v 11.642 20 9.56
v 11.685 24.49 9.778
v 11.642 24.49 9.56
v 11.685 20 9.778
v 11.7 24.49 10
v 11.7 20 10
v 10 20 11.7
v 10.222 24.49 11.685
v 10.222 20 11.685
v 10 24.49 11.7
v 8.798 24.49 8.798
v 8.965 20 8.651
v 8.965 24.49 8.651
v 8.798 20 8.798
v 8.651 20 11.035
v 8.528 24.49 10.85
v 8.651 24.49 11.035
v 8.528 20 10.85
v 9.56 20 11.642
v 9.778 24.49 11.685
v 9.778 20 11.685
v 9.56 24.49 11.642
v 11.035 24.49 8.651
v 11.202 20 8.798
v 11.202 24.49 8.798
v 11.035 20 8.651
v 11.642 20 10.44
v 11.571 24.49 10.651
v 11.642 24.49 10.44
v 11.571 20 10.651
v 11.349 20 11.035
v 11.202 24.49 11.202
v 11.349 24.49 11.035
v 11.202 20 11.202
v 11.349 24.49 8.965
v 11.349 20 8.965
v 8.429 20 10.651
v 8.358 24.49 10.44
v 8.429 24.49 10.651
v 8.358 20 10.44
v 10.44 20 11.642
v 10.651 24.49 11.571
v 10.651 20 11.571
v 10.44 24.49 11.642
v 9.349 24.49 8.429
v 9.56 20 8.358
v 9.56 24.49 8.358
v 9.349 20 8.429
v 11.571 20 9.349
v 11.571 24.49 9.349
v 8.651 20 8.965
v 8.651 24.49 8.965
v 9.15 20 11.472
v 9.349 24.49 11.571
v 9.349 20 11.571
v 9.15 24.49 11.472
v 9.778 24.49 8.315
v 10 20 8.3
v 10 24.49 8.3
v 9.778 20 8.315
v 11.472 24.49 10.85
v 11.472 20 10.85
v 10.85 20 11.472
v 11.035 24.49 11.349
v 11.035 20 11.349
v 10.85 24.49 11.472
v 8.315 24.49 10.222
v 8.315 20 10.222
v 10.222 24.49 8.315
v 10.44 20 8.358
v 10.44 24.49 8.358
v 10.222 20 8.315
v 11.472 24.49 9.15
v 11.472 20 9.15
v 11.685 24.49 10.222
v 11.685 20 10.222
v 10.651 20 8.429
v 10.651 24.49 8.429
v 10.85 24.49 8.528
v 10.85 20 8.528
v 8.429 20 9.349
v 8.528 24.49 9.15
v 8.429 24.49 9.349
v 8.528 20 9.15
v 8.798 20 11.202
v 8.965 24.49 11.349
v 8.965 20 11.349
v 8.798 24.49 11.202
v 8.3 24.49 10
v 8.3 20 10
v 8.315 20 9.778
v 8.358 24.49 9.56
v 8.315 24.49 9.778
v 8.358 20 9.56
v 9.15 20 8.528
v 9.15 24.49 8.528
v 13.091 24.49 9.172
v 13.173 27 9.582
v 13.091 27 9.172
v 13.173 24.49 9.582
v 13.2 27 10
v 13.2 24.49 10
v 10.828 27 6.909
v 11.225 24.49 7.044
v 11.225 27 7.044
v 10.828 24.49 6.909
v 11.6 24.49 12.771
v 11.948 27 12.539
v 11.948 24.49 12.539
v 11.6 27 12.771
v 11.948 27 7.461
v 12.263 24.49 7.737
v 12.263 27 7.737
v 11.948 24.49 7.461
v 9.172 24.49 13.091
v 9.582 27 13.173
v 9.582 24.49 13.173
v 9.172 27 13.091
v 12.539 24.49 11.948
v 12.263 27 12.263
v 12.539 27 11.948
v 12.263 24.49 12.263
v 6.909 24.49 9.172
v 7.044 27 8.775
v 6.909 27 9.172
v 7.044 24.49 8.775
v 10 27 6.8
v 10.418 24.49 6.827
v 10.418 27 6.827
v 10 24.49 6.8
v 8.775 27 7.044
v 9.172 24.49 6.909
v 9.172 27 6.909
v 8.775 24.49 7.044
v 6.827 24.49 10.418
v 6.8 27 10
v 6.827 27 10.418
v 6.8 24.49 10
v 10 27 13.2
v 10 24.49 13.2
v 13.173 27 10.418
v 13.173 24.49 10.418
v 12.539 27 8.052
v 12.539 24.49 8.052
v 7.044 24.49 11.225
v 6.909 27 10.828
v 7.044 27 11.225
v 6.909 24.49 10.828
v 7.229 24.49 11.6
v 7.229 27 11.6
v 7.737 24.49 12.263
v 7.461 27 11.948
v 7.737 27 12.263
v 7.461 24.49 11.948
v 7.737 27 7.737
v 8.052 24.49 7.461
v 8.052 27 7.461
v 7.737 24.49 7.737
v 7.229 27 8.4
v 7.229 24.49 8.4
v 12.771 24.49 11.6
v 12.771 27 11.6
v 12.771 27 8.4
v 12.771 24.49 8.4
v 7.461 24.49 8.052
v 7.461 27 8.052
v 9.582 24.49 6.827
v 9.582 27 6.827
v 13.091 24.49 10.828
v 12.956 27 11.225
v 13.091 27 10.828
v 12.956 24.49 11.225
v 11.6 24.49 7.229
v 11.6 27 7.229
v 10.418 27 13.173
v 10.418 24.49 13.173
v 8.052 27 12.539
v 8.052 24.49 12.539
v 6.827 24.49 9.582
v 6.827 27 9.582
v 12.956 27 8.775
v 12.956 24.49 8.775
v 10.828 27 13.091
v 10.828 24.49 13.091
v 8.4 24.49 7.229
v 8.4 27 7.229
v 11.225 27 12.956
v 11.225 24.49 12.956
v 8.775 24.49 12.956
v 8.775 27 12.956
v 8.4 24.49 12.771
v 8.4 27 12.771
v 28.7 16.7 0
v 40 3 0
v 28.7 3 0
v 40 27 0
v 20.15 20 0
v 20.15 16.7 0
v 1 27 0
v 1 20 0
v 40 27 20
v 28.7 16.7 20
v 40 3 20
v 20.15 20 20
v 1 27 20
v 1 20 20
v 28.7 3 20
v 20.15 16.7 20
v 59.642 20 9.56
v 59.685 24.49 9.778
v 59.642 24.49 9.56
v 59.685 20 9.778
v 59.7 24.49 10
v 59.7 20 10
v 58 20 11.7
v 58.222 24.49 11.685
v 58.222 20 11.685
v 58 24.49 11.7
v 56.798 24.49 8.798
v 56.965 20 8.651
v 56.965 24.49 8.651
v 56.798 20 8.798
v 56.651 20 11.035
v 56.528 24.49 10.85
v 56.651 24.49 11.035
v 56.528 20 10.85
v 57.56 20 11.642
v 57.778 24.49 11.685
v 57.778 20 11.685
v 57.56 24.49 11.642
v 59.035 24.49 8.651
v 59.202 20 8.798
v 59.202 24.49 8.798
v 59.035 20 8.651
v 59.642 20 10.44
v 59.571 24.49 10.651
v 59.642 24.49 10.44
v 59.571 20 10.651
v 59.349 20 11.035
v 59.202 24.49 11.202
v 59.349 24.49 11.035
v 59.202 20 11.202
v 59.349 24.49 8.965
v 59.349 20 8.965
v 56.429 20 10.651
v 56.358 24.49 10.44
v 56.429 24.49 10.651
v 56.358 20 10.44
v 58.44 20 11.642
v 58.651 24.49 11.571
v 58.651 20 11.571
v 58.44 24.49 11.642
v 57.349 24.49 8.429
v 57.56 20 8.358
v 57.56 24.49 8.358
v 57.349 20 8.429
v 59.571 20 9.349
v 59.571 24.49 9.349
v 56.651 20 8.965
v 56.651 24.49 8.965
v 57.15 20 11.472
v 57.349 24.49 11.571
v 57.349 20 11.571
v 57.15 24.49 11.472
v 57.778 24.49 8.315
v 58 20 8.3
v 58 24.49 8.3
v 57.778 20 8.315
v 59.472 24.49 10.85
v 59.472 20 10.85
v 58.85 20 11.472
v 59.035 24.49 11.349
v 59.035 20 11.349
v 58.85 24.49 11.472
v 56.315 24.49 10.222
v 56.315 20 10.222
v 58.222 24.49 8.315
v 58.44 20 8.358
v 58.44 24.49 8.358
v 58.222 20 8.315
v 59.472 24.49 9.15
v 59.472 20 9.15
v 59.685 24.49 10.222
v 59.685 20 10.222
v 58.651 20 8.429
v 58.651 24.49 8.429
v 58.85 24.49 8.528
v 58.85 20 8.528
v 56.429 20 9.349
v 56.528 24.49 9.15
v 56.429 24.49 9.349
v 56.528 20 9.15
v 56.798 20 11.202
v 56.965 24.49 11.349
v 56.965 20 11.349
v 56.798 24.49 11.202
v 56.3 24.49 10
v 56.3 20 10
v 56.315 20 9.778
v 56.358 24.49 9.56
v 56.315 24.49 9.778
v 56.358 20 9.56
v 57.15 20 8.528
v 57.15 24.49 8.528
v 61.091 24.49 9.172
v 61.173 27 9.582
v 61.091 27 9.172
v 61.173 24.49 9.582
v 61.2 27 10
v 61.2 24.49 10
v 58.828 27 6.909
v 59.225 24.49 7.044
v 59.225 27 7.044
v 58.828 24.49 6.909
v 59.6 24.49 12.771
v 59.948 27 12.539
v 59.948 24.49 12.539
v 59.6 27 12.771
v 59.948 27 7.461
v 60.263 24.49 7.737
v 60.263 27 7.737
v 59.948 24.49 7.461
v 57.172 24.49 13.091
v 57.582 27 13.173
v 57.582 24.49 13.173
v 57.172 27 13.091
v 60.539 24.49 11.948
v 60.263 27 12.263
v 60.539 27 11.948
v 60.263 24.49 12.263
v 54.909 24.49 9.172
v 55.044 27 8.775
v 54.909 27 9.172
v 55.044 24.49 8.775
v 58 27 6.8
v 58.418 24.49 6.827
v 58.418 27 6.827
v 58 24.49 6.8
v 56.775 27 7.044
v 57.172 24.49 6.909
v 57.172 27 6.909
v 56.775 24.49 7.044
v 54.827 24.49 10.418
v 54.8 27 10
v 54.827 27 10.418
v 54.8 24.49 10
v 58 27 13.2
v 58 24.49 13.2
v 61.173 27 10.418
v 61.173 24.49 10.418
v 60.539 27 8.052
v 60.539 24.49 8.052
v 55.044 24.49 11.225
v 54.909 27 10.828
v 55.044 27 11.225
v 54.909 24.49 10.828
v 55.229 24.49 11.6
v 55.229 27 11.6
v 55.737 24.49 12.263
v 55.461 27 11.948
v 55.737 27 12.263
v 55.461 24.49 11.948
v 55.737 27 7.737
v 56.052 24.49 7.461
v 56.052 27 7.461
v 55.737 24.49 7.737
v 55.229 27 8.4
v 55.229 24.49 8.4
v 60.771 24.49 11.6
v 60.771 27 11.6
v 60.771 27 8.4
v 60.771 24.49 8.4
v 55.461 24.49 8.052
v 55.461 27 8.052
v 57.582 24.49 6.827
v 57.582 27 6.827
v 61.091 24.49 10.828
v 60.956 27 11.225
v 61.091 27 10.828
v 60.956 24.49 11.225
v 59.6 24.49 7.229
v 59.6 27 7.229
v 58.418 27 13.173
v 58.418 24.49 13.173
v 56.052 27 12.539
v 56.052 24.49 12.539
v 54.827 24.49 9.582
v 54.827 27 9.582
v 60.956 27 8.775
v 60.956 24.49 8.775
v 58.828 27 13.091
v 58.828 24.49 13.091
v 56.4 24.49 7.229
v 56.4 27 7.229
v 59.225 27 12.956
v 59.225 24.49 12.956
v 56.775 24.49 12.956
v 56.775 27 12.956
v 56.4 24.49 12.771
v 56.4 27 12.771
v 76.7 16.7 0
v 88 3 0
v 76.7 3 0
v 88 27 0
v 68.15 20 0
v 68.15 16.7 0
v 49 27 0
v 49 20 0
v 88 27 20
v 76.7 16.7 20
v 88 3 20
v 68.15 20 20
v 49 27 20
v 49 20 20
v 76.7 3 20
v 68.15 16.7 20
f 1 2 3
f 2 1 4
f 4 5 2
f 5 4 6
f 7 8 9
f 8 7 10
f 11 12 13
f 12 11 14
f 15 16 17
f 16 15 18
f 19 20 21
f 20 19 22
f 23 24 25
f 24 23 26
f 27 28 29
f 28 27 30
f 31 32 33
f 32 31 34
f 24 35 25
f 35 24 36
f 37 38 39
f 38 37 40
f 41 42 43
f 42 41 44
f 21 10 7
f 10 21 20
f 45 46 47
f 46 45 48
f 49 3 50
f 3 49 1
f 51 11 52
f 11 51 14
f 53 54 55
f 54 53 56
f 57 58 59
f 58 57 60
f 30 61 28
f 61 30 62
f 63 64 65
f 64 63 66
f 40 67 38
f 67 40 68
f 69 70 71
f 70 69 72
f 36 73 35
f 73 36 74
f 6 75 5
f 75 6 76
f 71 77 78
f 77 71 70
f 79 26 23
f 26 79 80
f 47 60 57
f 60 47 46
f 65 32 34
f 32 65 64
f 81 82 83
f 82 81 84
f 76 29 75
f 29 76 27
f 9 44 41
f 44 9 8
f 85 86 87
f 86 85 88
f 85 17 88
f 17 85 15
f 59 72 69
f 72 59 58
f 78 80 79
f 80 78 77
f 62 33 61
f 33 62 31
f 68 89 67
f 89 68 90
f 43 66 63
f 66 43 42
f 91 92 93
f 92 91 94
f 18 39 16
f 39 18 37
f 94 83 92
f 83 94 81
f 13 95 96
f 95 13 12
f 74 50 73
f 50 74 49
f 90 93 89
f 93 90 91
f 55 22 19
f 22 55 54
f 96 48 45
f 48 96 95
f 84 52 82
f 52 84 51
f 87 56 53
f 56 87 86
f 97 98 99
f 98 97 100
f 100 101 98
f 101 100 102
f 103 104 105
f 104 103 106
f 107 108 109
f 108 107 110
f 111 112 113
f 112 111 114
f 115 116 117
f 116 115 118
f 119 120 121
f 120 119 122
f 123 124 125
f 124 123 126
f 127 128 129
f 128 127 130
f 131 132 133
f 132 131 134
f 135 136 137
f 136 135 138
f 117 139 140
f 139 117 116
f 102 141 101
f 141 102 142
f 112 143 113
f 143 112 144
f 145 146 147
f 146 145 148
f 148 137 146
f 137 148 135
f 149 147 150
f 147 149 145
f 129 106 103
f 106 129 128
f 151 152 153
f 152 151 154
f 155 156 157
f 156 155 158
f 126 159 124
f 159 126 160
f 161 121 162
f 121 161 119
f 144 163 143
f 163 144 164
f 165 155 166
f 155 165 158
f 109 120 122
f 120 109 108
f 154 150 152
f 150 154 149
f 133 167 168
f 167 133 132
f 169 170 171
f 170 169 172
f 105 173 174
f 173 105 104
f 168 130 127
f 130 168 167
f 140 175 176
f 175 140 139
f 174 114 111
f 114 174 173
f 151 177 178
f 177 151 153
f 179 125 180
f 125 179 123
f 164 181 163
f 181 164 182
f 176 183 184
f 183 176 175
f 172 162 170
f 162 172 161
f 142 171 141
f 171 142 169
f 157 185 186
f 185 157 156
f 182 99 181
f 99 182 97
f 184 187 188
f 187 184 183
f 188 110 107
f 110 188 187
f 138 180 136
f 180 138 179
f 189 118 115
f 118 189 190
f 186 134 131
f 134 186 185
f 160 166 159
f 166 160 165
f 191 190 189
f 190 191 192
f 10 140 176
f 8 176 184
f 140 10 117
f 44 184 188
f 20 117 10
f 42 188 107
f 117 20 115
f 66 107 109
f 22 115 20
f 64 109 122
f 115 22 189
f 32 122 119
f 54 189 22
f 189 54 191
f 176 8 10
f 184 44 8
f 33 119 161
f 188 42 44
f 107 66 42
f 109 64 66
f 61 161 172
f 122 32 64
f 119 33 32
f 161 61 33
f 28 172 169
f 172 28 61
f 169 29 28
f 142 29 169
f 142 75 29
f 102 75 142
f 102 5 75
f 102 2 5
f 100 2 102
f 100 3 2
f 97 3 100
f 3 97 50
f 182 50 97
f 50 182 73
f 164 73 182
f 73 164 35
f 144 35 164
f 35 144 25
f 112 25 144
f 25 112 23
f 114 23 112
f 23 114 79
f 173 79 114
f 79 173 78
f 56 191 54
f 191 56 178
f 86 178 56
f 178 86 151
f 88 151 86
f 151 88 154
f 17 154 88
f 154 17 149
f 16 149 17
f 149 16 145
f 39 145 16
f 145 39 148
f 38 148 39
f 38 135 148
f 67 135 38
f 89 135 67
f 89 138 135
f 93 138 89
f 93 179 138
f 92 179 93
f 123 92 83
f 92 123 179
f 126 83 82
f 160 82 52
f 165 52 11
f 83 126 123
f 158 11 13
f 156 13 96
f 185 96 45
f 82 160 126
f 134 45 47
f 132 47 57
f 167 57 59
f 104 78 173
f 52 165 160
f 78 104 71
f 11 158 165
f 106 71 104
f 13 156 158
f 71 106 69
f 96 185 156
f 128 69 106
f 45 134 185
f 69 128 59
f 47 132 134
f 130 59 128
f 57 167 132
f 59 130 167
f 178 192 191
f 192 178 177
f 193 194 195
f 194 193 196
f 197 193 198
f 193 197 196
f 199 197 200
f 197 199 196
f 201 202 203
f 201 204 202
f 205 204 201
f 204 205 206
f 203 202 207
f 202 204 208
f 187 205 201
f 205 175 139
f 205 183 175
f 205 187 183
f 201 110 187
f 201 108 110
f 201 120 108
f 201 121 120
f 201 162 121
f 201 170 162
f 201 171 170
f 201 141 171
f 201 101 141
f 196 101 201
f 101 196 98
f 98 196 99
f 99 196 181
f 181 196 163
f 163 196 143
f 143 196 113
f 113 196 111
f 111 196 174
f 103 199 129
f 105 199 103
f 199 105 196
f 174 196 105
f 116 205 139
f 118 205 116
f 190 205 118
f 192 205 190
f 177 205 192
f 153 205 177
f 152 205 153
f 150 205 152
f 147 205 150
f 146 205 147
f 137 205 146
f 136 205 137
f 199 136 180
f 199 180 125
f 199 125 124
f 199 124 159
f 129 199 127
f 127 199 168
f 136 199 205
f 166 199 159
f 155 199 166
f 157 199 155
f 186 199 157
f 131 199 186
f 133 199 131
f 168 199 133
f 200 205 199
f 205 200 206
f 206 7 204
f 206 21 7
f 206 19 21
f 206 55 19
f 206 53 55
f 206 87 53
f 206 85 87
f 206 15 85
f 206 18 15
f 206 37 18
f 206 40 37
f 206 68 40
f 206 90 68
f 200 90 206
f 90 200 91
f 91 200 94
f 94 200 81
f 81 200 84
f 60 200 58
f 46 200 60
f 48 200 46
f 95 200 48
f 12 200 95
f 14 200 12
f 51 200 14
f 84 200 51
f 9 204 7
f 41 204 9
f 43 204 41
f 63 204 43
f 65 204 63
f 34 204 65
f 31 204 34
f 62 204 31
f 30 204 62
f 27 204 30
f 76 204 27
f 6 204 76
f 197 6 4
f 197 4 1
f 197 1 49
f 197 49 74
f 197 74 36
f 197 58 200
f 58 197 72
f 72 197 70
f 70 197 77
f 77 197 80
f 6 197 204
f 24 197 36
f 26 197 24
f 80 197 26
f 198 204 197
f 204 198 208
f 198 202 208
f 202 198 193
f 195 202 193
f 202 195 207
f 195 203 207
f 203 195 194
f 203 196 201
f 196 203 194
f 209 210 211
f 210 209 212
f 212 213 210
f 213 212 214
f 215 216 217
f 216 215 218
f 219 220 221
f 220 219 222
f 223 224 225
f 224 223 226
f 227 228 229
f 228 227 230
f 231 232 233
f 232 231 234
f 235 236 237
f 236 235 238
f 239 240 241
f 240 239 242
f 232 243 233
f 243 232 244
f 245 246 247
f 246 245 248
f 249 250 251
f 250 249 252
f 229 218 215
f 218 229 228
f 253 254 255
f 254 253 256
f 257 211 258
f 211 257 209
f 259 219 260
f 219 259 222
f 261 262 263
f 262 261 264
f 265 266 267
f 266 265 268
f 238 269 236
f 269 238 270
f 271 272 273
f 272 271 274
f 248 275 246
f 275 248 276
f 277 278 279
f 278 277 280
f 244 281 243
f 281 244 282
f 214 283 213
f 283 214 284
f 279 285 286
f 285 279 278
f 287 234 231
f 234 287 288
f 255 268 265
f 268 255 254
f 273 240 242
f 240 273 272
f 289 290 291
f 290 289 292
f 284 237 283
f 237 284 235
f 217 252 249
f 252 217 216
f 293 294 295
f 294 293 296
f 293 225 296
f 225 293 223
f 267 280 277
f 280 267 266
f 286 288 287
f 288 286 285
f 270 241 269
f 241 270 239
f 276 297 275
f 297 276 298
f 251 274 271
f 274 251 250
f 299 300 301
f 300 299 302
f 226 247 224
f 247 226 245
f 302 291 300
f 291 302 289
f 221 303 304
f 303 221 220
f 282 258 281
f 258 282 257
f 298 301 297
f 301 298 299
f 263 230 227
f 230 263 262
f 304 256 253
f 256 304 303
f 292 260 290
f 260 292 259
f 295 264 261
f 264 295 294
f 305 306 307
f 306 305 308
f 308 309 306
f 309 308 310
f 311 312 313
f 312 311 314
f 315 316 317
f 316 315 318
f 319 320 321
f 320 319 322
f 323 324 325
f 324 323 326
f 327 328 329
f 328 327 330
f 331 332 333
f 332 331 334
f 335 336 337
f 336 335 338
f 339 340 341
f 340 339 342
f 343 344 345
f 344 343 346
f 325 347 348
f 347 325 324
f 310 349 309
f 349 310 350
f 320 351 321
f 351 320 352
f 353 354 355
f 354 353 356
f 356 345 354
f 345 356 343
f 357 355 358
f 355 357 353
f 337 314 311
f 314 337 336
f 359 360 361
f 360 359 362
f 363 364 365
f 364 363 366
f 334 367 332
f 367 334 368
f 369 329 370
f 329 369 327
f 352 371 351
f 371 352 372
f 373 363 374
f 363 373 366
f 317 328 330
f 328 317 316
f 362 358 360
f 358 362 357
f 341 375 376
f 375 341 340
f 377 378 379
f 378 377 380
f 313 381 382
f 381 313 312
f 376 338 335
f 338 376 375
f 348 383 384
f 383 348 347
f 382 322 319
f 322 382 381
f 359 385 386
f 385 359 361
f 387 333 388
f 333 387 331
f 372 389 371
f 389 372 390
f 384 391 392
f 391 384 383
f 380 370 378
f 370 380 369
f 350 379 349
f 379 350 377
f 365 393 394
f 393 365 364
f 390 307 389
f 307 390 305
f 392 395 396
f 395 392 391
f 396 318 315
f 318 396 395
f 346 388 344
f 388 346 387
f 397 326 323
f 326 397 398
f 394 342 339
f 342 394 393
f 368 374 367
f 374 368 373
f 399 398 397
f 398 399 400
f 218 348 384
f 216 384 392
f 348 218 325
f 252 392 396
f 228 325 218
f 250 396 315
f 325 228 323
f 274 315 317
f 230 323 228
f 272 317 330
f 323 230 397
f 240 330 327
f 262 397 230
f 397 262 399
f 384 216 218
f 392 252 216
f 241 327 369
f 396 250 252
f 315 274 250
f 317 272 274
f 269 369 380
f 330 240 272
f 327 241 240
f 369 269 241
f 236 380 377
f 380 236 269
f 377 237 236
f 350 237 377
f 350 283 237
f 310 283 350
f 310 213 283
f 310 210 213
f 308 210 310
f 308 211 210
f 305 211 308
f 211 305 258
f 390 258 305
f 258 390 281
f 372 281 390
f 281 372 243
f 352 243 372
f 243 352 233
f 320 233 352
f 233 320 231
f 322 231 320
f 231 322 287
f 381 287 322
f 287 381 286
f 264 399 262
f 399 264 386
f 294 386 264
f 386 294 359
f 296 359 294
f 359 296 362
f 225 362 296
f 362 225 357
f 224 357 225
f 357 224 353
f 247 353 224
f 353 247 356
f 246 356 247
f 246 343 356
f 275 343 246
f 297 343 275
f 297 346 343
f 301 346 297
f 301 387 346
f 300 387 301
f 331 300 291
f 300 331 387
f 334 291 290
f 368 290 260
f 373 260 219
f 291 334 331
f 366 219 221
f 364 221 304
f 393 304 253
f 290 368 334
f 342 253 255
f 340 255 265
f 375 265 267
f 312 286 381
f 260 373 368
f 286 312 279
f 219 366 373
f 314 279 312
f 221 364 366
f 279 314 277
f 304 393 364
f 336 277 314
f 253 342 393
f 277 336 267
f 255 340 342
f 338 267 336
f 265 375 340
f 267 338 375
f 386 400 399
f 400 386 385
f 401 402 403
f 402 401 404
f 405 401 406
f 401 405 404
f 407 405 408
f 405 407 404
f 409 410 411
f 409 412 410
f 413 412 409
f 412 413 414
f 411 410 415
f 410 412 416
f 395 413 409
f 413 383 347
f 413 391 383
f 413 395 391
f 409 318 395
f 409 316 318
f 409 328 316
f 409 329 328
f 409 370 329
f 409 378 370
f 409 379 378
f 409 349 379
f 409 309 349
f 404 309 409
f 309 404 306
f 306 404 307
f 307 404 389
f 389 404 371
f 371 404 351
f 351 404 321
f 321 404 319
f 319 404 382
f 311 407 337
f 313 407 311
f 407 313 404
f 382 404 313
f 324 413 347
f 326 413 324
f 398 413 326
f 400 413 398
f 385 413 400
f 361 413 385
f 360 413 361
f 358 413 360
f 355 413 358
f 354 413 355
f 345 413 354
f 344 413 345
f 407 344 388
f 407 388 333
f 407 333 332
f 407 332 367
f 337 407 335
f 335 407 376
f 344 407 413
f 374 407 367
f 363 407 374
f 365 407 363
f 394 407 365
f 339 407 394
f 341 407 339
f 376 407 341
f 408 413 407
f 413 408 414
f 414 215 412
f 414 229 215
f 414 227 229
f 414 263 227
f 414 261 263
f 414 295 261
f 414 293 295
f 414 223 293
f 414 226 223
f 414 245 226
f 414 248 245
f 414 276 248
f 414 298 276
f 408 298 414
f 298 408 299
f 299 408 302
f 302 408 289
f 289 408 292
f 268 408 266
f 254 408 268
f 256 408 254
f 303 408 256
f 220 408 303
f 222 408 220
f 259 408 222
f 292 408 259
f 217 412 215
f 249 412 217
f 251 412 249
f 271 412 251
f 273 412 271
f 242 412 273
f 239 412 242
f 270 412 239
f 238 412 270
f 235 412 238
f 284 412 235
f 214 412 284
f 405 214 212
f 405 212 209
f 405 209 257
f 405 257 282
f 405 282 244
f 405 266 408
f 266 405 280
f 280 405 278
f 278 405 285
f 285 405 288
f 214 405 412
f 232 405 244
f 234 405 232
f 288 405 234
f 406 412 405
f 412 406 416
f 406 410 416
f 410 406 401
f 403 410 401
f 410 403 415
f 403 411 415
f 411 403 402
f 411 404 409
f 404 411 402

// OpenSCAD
// X rail end stop, v2: clamps anywhere along the backer extrusion's TOP slot with one M3x10 + T-nut.
// No tapped end hole, no bumper screw. A leg hangs down in front of the rail and the edge of the
// carriage bracket's front plate runs into it, about 5 mm before the carriage itself would.
// One part serves both ends. Prints on its side (as loaded), no supports.
//
// Profile frame: U toward you (U=0 extrusion back face), V up (V=0 extrusion bottom). Extruded along the rail.

ext = 20; rail_h = 8; rail_w = 12; stack = 13; plate_t = 7;
len = 20;          // along the rail
top_t = 7;         // block on top of the extrusion
u0 = 1;            // clear of the lip / spacers behind
rail_gap = 0.7;    // around the rail
leg_bot = 3;       // leg reaches this far down (V)
screw_u = ext/2; m3_clear = 3.4; head_d = 6.4; head_cb = 2.5;
key_w = 5.8; key_h = 0;   // no key: it bottomed on the T-nut before the block clamped
$fn = 48; eps = 0.01;

u_max = ext + stack + plate_t;          // flush with the bracket's front face
rail_top = ext/2 + rail_w/2;

module profile() polygon([
  [u0, ext], [ext + 0.15, ext], [ext + 0.15, rail_top + rail_gap], [ext + rail_h + rail_gap, rail_top + rail_gap],
  [ext + rail_h + rail_gap, leg_bot], [u_max, leg_bot], [u_max, ext + top_t], [u0, ext + top_t]]);

module stop() difference() {
  linear_extrude(len) profile();
  translate([screw_u, ext - key_h - eps, len/2]) rotate([-90, 0, 0]) {
    cylinder(d = m3_clear, h = top_t + key_h + 2*eps);
    translate([0, 0, key_h + top_t - head_cb]) cylinder(d = head_d, h = head_cb + 2*eps);
  }
}

mode = "print";
if (mode == "assembly") {
  color("orange") rotate([90, 0, 90]) stop();
  color("silver") translate([-60, 0, 0]) cube([100, ext, ext]);
  color("dimgray") translate([-60, ext, ext/2 - 6]) cube([100, 8, 12]);
  color("gray") translate([-60 , ext + 3, ext/2 - 13.5]) cube([45.4, 10, 27]);
  color("royalblue", 0.7) translate([-65.3, ext + stack, -21]) cube([56, plate_t, 44.5]);
} else for (i = [0, 1]) translate([i*48, 0, 0]) stop();
